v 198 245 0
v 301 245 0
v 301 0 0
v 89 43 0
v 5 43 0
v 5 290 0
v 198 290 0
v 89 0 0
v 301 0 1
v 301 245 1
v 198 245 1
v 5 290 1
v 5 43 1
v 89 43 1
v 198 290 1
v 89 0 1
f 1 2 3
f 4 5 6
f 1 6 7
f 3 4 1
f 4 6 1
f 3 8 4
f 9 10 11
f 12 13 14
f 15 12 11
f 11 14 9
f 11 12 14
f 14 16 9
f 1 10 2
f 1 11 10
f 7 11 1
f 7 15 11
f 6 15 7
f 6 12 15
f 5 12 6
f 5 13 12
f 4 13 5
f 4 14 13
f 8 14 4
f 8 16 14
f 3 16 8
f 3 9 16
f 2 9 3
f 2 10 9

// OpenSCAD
/* four clips */
if (0) { linear_extrude(height=1) polygon(points=[[10,32],[10,245],[104,245],[104,290],[198,290],[198,245],
                [301,245],[301,29],[224,29],[224,0],[89,0],[89,32]]);
}

/* two clips */
if (0) linear_extrude(height=1) polygon(points=[[10,32],[10,290],[198,290],[198,245],
                [301,245],[301,0],[89,0],[89,32]]);

/* two clips, longer fan arm */
linear_extrude(height=1) polygon(points=[[5,43],[5,290],[198,290],[198,245],
                [301,245],[301,0],[89,0],[89,43]]);
